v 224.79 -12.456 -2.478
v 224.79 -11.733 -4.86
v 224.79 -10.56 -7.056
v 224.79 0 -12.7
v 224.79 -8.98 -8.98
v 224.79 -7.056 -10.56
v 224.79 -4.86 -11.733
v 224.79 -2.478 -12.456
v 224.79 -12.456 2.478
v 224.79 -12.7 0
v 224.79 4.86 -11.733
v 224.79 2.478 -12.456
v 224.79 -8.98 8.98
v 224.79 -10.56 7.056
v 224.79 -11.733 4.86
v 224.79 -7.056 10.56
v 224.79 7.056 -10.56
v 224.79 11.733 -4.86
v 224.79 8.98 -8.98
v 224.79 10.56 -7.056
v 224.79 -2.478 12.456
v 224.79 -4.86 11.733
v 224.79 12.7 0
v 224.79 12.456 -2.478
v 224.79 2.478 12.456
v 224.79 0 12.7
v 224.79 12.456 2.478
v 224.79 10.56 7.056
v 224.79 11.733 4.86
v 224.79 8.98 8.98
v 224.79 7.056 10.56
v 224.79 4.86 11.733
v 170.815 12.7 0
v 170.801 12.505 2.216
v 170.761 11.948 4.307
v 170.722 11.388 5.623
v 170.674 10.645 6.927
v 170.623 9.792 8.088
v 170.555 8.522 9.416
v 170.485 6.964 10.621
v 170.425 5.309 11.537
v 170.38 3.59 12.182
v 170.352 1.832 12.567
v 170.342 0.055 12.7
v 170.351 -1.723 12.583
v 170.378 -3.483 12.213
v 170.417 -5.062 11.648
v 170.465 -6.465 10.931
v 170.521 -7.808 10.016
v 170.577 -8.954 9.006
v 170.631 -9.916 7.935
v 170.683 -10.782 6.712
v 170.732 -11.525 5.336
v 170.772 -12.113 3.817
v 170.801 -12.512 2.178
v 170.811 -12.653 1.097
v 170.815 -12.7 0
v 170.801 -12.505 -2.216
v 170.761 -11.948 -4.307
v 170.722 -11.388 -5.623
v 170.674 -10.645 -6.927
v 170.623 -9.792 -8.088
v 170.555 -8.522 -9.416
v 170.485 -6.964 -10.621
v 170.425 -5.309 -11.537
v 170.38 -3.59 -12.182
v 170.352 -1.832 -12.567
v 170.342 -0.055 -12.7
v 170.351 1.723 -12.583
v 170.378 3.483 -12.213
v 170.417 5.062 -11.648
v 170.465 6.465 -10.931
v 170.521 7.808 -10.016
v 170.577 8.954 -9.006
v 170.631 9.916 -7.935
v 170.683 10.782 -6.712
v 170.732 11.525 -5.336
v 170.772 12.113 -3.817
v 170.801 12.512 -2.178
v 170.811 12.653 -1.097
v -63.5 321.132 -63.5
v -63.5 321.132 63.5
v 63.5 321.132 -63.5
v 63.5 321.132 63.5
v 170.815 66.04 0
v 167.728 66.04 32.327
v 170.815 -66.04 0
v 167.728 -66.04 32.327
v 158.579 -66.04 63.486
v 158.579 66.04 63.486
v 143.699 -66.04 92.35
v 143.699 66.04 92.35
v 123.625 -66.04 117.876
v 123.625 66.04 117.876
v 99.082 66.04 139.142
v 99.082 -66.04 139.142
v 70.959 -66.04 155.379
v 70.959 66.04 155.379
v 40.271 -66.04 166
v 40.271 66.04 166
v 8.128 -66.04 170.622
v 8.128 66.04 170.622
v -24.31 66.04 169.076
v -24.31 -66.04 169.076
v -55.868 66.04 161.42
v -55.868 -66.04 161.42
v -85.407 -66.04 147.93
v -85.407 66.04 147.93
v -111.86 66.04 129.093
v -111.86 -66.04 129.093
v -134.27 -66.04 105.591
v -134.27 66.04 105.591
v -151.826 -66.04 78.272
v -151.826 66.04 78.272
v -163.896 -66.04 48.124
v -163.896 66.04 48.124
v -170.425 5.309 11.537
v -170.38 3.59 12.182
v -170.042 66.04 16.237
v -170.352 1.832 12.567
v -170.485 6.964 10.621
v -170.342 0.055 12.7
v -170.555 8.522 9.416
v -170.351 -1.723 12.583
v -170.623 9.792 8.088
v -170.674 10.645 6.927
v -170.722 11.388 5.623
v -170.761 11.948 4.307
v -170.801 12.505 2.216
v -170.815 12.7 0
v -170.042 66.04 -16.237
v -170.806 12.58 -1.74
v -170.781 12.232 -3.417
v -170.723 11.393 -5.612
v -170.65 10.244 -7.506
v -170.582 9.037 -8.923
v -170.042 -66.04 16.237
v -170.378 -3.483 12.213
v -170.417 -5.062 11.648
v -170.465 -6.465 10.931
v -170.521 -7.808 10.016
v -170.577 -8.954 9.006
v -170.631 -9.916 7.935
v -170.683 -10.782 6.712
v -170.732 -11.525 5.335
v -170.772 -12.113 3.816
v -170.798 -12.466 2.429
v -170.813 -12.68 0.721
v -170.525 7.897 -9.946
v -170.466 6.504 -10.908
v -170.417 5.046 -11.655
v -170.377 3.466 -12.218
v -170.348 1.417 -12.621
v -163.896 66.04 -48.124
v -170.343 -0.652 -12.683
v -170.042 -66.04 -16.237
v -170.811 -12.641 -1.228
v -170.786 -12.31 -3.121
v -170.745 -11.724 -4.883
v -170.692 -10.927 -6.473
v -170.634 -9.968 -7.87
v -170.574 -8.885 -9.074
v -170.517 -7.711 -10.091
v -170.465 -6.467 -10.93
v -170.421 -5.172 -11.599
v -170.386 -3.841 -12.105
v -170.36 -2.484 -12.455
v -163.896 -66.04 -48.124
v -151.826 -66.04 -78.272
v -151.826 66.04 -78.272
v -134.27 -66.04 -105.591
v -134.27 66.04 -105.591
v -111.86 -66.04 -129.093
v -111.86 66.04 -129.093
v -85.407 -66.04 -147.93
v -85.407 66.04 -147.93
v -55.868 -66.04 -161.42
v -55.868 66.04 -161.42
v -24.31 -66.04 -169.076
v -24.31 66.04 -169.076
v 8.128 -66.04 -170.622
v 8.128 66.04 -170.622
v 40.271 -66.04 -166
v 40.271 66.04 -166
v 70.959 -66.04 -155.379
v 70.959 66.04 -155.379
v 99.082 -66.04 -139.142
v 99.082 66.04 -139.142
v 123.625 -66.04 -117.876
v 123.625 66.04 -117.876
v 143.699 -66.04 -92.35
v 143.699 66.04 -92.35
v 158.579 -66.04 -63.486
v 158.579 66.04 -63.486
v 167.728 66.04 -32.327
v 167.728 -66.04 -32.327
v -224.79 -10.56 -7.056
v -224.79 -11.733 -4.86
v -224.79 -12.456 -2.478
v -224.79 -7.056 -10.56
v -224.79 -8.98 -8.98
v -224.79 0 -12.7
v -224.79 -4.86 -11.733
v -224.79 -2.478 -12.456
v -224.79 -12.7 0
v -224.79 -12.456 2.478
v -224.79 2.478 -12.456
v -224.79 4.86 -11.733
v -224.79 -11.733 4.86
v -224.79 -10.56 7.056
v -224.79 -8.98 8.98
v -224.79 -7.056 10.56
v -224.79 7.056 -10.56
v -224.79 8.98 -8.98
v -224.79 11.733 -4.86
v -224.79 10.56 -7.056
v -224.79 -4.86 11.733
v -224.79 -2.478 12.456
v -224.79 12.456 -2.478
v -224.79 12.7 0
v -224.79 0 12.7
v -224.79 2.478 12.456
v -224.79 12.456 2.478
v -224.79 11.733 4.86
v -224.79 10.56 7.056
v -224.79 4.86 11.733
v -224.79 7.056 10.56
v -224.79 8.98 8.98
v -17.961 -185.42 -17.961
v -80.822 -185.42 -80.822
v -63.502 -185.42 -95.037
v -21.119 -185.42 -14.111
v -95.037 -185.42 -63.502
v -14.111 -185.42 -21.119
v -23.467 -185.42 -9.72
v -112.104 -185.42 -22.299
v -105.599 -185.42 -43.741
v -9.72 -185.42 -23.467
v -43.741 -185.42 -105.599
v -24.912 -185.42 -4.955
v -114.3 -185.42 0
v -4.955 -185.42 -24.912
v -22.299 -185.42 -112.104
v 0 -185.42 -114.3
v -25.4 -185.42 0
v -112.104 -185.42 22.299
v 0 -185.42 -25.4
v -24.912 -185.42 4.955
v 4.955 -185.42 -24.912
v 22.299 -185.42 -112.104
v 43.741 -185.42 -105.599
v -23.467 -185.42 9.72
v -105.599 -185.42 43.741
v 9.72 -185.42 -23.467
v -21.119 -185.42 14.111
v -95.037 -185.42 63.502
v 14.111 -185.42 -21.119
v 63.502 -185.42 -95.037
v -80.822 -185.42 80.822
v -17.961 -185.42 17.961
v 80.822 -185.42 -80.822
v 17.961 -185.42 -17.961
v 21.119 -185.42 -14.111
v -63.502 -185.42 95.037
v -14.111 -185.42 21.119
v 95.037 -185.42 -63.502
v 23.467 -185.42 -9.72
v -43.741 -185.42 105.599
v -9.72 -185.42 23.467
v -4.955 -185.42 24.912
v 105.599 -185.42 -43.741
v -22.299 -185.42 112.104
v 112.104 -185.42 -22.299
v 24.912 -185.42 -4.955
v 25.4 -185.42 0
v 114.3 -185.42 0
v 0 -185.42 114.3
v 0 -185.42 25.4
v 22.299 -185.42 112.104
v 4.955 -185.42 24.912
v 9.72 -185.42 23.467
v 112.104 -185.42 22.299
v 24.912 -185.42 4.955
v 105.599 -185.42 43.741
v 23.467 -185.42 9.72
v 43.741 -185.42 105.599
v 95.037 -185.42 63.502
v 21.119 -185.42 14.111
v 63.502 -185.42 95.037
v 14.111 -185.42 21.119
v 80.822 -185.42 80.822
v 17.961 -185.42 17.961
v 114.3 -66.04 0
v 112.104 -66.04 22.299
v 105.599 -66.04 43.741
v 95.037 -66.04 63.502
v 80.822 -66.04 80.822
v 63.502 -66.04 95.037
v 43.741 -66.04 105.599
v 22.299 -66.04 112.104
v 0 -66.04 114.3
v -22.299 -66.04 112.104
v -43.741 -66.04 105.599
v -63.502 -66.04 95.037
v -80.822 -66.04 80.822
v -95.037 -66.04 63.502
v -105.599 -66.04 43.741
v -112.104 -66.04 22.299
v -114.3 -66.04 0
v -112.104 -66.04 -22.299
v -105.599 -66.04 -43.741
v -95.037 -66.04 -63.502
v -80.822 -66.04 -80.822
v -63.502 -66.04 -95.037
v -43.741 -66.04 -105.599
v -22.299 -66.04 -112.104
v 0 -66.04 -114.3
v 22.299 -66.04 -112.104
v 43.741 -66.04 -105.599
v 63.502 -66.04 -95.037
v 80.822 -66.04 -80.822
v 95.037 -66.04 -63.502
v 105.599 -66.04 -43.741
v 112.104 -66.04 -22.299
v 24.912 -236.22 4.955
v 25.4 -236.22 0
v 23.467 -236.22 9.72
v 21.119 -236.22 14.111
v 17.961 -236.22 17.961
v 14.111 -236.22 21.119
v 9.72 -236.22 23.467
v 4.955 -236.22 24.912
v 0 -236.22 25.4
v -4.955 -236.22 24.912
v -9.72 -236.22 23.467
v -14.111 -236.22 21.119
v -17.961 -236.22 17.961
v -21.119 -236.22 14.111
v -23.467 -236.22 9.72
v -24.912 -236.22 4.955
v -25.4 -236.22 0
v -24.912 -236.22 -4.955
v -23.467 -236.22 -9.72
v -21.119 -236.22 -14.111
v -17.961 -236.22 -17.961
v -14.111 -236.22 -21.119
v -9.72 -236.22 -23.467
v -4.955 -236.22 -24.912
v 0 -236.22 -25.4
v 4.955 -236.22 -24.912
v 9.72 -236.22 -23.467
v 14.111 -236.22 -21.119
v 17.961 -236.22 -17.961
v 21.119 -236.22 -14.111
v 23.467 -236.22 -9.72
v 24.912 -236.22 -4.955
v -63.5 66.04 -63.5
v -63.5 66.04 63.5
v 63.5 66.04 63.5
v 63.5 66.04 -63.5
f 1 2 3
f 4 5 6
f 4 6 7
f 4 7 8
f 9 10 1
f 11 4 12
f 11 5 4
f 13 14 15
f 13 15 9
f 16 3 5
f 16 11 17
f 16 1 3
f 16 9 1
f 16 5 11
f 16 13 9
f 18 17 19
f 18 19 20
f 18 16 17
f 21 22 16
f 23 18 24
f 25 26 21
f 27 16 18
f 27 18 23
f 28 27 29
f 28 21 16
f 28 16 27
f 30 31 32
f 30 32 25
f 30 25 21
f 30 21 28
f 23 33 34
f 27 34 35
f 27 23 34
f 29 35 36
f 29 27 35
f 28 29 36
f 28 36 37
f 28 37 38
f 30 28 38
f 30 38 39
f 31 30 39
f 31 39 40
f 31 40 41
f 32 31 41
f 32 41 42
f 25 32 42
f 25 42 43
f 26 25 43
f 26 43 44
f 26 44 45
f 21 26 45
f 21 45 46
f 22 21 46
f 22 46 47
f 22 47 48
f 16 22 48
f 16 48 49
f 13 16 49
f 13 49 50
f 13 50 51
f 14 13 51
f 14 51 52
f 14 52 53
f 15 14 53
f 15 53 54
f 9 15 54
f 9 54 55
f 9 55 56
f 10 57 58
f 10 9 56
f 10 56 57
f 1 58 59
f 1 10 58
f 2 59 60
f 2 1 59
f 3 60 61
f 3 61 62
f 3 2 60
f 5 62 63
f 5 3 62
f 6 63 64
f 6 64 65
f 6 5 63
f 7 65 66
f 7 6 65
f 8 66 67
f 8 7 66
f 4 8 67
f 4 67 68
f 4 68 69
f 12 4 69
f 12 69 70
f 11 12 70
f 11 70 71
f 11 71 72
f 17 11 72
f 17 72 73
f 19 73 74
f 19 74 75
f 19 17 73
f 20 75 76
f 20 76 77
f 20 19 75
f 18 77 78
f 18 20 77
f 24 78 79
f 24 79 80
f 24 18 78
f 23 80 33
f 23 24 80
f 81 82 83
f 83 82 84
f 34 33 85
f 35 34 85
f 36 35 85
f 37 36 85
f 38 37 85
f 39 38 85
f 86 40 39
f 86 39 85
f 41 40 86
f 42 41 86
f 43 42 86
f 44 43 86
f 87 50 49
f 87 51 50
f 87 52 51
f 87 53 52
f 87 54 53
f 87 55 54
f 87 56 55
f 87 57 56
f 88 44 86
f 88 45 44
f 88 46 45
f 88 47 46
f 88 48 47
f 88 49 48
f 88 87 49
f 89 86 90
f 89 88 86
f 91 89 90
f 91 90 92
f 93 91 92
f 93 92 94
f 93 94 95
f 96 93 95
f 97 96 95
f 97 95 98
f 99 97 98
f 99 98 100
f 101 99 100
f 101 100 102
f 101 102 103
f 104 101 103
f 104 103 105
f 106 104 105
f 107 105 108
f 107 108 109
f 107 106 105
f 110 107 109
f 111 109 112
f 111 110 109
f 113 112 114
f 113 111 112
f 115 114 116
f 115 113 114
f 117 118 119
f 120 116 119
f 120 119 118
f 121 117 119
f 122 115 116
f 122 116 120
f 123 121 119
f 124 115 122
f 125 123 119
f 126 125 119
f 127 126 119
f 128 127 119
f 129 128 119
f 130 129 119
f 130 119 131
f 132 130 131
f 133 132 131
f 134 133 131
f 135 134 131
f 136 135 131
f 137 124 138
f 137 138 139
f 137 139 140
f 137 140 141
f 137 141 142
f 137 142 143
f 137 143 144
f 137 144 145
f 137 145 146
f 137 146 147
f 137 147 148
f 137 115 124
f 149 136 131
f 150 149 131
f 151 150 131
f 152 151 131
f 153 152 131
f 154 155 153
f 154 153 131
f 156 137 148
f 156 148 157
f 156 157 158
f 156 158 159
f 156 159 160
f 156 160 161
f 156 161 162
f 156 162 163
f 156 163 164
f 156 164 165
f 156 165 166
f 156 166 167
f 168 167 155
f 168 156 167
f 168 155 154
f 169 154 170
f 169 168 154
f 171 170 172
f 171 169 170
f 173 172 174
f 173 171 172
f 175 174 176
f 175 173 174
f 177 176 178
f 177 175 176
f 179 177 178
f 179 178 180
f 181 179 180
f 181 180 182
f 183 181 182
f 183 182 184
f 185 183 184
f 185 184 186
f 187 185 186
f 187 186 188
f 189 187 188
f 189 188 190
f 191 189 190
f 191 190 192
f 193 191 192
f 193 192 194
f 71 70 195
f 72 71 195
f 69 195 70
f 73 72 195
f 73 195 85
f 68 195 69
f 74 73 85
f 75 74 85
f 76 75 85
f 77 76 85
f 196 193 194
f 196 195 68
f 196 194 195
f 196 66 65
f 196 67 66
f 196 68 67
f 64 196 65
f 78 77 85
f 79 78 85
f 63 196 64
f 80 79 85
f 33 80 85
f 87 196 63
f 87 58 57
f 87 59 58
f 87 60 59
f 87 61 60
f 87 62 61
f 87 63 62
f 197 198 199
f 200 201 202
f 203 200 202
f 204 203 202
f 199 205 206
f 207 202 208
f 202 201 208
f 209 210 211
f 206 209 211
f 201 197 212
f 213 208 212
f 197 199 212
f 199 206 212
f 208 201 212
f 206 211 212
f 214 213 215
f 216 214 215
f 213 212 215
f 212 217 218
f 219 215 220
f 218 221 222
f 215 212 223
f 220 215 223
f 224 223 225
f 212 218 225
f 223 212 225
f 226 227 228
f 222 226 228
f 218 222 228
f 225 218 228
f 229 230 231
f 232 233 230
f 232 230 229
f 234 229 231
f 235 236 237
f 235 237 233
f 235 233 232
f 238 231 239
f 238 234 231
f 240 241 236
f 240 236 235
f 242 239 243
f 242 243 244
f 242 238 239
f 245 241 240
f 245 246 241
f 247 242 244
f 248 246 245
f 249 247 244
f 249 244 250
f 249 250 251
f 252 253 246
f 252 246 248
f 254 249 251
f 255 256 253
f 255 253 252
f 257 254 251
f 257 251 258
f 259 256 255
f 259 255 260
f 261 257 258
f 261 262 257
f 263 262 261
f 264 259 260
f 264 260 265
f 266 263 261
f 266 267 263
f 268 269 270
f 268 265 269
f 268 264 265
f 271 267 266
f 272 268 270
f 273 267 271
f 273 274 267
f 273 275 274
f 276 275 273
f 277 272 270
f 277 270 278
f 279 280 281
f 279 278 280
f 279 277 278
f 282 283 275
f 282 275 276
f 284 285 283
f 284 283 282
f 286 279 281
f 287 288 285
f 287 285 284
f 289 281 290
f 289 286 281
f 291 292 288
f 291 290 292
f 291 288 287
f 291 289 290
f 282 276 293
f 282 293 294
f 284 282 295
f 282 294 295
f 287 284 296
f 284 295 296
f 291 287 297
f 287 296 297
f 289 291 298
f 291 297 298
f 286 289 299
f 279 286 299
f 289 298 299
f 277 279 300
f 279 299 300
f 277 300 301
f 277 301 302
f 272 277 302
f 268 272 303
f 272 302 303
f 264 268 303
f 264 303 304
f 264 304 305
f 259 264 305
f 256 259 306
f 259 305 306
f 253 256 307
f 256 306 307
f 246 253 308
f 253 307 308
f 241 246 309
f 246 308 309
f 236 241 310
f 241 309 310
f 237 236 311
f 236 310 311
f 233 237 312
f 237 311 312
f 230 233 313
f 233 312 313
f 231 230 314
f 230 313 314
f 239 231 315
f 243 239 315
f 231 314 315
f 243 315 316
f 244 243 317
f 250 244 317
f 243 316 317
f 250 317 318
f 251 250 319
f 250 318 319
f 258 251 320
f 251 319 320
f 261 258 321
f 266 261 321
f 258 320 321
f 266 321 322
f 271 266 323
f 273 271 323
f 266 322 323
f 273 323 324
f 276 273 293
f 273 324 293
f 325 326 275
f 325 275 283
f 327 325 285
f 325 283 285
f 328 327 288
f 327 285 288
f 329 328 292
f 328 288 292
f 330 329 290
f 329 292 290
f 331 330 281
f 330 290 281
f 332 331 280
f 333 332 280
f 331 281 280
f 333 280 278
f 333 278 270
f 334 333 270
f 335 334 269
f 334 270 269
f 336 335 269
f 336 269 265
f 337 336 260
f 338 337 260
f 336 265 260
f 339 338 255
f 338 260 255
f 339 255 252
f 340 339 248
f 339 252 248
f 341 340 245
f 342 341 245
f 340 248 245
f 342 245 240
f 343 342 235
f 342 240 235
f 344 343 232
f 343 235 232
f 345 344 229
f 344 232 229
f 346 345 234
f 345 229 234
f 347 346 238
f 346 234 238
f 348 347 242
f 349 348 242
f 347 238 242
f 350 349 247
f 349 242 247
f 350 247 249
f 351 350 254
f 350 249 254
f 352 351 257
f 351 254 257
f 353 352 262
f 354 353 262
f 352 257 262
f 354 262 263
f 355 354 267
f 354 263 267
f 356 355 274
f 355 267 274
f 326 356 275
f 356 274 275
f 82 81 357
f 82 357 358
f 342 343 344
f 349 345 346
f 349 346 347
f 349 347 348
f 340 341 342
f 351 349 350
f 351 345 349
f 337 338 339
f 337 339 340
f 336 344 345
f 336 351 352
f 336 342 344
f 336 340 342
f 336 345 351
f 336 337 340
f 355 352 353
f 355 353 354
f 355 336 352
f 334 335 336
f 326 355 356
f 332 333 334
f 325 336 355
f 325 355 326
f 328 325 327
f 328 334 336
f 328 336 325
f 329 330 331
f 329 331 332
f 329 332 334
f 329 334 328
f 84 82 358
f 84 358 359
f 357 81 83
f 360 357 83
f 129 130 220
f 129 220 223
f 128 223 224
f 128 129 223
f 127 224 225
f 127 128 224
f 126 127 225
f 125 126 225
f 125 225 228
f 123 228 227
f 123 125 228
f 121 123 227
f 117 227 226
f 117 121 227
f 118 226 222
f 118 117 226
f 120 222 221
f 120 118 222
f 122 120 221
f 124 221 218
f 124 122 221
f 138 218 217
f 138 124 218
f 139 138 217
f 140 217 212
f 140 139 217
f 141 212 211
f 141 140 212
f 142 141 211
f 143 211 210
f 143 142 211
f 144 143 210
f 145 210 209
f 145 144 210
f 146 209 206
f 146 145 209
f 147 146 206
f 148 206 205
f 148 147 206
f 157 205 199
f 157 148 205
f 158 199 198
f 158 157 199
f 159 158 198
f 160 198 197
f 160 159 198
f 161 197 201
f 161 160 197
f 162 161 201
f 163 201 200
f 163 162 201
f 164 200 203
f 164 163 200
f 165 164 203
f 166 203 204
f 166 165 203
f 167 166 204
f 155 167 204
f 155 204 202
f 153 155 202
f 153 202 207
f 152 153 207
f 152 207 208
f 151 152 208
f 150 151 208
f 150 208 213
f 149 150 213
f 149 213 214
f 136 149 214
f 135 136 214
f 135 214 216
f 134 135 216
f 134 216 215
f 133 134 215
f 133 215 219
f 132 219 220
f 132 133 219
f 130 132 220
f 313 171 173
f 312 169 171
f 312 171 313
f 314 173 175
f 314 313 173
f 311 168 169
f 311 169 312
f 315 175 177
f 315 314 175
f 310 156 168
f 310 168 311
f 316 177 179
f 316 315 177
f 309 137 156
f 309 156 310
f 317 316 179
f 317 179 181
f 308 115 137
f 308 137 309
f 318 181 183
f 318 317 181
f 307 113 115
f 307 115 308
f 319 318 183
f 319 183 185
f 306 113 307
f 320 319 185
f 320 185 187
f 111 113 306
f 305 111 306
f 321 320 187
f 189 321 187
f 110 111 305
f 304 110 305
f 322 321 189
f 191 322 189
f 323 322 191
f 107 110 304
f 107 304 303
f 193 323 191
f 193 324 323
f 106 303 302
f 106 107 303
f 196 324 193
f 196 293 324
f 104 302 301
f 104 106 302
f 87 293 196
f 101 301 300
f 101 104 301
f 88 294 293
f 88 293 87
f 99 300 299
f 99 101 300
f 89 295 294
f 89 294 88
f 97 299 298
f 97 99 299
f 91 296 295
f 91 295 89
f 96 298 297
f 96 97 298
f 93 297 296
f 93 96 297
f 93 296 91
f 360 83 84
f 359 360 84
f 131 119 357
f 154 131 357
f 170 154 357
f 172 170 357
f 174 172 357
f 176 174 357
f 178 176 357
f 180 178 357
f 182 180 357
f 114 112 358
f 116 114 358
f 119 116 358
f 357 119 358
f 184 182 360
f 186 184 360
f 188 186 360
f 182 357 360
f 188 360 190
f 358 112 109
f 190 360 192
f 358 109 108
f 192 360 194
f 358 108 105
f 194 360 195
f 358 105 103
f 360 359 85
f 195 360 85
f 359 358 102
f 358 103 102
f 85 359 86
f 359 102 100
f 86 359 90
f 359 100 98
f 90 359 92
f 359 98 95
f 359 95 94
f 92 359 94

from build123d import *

# Parameters (mm, degrees)
F0_W     = 127
F0_H     = 127
F1_DEPTH = 321.1322
F2_R     = 170.815
F3_DEPTH = 66.04
F4_R     = 114.3
F5_DEPTH = 119.38
F6_R     = 25.4
F7_DEPTH = 50.8
F8_R     = 12.7
F9_DEPTH = 224.79


with BuildPart() as f1:
    # F0 (on Front) → F1 (new body)
    with BuildSketch(Plane.XZ):
        Rectangle(F0_W, F0_H)
    extrude(amount=-F1_DEPTH)

    # F2 (on Front) → F3 (join, symmetric)
    with BuildSketch(Plane.XZ):
        Circle(F2_R)
    extrude(amount=F3_DEPTH, both=True)

    # F4 (on face) → F5 (join)
    with BuildSketch(Plane.XZ.offset(66.04)):
        Circle(F4_R)
    extrude(amount=F5_DEPTH)

    # F6 (on face) → F7 (join)
    with BuildSketch(Plane.XZ.offset(185.42)):
        Circle(F6_R)
    extrude(amount=F7_DEPTH)

    # F8 (on Right) → F9 (join, symmetric)
    with BuildSketch(Plane.YZ):
        Circle(F8_R)
    extrude(amount=F9_DEPTH, both=True)


solid = f1.part
